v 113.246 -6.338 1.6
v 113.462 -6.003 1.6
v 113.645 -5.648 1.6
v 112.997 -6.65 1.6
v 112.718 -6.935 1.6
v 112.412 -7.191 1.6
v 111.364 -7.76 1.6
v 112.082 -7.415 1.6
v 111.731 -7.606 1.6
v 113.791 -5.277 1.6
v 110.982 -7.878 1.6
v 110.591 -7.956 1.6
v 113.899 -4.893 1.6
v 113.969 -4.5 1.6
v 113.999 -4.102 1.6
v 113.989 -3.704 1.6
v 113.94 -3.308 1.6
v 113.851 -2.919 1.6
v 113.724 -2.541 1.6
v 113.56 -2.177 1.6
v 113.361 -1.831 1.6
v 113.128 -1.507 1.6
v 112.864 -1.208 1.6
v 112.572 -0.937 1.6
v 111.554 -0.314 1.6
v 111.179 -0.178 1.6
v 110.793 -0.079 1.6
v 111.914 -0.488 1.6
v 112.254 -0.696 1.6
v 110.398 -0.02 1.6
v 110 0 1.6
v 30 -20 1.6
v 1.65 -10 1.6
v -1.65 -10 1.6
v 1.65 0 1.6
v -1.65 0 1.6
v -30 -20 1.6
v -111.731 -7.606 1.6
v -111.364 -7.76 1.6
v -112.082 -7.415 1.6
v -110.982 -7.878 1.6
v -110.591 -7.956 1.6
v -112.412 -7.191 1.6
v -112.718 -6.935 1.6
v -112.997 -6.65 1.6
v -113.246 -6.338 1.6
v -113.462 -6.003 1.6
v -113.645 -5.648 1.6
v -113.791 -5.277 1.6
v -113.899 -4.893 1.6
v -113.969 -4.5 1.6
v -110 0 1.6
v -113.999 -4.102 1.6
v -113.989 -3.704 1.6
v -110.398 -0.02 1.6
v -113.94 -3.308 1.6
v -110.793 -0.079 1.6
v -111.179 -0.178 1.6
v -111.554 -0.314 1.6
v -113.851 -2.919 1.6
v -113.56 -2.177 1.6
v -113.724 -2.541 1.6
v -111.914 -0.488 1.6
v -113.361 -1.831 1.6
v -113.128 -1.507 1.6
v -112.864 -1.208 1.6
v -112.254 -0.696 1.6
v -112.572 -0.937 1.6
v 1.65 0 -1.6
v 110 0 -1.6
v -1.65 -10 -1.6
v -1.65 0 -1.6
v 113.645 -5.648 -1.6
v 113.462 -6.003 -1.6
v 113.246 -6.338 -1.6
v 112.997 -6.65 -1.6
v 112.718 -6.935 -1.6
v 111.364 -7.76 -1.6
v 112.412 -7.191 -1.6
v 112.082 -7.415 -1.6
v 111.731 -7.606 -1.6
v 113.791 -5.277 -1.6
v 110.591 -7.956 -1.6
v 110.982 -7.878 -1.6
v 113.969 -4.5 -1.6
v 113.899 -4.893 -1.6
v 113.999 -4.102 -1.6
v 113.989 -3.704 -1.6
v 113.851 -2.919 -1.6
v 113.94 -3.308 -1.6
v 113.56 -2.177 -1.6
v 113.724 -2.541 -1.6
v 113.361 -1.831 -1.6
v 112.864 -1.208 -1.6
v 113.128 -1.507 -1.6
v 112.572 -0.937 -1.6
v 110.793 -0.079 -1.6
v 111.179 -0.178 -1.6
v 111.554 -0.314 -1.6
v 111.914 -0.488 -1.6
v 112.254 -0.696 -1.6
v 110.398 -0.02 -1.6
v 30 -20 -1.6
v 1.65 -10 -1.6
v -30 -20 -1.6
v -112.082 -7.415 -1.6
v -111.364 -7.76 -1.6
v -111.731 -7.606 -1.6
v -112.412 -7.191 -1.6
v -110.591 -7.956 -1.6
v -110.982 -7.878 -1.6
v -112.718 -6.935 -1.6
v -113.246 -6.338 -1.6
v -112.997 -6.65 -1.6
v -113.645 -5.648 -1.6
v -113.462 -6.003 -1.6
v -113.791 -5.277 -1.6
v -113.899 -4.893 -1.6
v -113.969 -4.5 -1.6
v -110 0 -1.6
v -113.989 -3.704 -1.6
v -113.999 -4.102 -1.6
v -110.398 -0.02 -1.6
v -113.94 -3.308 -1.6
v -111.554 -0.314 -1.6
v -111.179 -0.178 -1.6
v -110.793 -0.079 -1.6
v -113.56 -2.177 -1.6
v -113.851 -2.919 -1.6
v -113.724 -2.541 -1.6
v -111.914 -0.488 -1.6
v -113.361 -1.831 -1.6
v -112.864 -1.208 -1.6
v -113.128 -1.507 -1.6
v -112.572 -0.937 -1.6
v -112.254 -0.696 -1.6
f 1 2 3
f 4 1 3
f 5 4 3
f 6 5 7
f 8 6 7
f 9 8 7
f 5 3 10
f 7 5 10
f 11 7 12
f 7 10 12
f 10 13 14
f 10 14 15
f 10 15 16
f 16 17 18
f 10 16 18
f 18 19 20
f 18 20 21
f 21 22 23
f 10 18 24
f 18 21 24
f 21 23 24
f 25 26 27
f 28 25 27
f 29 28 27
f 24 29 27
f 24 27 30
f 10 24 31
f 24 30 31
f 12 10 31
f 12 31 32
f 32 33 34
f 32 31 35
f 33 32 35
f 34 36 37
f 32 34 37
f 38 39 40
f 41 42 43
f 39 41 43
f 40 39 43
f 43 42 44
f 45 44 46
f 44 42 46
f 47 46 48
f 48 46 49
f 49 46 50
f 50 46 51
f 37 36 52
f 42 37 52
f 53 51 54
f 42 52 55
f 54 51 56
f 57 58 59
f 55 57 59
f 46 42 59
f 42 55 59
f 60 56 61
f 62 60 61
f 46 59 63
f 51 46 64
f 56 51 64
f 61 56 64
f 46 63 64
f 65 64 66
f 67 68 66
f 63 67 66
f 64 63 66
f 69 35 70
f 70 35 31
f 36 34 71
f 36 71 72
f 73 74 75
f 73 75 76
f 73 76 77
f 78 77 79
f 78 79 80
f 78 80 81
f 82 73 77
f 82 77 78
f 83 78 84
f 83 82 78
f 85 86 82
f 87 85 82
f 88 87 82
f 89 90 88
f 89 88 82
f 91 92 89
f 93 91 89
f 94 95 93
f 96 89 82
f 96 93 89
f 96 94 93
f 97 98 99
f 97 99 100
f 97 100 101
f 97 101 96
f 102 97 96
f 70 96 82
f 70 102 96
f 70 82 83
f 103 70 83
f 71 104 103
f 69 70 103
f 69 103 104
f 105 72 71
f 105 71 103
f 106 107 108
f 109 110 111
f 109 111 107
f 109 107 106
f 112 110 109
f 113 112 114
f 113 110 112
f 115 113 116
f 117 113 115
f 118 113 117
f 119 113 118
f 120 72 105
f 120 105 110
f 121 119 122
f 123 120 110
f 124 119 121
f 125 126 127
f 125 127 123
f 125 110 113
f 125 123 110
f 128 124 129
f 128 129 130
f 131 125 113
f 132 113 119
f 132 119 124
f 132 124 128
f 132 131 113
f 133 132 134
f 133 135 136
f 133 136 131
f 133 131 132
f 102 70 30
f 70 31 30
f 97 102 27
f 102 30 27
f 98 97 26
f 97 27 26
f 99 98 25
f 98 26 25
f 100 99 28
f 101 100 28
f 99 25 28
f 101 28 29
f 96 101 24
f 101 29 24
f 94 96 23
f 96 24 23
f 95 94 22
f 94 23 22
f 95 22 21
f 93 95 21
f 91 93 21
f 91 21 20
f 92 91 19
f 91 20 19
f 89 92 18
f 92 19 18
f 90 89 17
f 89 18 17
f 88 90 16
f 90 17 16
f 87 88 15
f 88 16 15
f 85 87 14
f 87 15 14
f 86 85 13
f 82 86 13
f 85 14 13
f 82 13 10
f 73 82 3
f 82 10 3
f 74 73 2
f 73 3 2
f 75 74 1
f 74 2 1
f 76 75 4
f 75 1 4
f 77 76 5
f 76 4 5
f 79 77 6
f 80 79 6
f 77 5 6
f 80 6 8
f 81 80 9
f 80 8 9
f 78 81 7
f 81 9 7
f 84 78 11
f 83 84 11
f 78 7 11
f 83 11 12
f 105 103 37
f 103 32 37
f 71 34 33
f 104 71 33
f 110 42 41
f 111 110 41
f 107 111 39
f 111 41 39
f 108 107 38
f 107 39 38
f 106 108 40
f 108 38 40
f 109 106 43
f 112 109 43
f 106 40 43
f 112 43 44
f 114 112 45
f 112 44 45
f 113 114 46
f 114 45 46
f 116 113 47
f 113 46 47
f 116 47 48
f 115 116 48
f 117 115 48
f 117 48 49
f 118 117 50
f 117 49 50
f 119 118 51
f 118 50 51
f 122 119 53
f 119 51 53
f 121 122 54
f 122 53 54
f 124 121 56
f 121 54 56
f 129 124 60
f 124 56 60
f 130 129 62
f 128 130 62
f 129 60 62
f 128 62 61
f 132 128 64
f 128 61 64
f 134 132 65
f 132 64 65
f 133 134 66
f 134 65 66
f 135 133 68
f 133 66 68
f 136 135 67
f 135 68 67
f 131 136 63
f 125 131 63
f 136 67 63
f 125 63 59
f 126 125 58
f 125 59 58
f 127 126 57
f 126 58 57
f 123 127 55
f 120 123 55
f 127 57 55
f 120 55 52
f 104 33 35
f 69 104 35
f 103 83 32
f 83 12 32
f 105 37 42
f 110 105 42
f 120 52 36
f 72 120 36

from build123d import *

# Parameters (mm, degrees)
BOSS_EXTRUDE1_DEPTH = 1.6
CUT_EXTRUDE2_REACH  = 117.785
SKETCH2_4_W         = 3.3
SKETCH2_4_H         = 10


with BuildPart() as part:
    # Sketch1 → Boss-Extrude1 (new, symmetric)
    with BuildSketch(Plane.XY):
        with BuildLine():
            Line((-110, 0), (110, 0))
            ThreePointArc((110, 0), (113.989001648, -3.703578255), (110.591213415, -7.956067075))
            Line((110.591213415, -7.956067075), (30, -20))
            Line((30, -20), (0, -20))
            Line((0, -20), (-30, -20))
            Line((-30, -20), (-110.591213415, -7.956067075))
            ThreePointArc((-110.591213415, -7.956067075), (-113.989001648, -3.703578255), (-110, 0))
        make_face()
    extrude(amount=BOSS_EXTRUDE1_DEPTH, both=True)

    # Sketch2<4> → Cut-Extrude2 (cut, up to next)
    with BuildSketch(Plane.XY.offset(1.6), mode=Mode.PRIVATE) as cut_extrude2_sk1:
        with Locations((0, -5)):
            Rectangle(SKETCH2_4_W, SKETCH2_4_H)
    cut_extrude2_tool1 = extrude(cut_extrude2_sk1.sketch, amount=-CUT_EXTRUDE2_REACH, mode=Mode.PRIVATE) & part.part
    add(cut_extrude2_tool1.solids().sort_by_distance((0, -5, 1.6))[0], mode=Mode.SUBTRACT)


solid = part.part
